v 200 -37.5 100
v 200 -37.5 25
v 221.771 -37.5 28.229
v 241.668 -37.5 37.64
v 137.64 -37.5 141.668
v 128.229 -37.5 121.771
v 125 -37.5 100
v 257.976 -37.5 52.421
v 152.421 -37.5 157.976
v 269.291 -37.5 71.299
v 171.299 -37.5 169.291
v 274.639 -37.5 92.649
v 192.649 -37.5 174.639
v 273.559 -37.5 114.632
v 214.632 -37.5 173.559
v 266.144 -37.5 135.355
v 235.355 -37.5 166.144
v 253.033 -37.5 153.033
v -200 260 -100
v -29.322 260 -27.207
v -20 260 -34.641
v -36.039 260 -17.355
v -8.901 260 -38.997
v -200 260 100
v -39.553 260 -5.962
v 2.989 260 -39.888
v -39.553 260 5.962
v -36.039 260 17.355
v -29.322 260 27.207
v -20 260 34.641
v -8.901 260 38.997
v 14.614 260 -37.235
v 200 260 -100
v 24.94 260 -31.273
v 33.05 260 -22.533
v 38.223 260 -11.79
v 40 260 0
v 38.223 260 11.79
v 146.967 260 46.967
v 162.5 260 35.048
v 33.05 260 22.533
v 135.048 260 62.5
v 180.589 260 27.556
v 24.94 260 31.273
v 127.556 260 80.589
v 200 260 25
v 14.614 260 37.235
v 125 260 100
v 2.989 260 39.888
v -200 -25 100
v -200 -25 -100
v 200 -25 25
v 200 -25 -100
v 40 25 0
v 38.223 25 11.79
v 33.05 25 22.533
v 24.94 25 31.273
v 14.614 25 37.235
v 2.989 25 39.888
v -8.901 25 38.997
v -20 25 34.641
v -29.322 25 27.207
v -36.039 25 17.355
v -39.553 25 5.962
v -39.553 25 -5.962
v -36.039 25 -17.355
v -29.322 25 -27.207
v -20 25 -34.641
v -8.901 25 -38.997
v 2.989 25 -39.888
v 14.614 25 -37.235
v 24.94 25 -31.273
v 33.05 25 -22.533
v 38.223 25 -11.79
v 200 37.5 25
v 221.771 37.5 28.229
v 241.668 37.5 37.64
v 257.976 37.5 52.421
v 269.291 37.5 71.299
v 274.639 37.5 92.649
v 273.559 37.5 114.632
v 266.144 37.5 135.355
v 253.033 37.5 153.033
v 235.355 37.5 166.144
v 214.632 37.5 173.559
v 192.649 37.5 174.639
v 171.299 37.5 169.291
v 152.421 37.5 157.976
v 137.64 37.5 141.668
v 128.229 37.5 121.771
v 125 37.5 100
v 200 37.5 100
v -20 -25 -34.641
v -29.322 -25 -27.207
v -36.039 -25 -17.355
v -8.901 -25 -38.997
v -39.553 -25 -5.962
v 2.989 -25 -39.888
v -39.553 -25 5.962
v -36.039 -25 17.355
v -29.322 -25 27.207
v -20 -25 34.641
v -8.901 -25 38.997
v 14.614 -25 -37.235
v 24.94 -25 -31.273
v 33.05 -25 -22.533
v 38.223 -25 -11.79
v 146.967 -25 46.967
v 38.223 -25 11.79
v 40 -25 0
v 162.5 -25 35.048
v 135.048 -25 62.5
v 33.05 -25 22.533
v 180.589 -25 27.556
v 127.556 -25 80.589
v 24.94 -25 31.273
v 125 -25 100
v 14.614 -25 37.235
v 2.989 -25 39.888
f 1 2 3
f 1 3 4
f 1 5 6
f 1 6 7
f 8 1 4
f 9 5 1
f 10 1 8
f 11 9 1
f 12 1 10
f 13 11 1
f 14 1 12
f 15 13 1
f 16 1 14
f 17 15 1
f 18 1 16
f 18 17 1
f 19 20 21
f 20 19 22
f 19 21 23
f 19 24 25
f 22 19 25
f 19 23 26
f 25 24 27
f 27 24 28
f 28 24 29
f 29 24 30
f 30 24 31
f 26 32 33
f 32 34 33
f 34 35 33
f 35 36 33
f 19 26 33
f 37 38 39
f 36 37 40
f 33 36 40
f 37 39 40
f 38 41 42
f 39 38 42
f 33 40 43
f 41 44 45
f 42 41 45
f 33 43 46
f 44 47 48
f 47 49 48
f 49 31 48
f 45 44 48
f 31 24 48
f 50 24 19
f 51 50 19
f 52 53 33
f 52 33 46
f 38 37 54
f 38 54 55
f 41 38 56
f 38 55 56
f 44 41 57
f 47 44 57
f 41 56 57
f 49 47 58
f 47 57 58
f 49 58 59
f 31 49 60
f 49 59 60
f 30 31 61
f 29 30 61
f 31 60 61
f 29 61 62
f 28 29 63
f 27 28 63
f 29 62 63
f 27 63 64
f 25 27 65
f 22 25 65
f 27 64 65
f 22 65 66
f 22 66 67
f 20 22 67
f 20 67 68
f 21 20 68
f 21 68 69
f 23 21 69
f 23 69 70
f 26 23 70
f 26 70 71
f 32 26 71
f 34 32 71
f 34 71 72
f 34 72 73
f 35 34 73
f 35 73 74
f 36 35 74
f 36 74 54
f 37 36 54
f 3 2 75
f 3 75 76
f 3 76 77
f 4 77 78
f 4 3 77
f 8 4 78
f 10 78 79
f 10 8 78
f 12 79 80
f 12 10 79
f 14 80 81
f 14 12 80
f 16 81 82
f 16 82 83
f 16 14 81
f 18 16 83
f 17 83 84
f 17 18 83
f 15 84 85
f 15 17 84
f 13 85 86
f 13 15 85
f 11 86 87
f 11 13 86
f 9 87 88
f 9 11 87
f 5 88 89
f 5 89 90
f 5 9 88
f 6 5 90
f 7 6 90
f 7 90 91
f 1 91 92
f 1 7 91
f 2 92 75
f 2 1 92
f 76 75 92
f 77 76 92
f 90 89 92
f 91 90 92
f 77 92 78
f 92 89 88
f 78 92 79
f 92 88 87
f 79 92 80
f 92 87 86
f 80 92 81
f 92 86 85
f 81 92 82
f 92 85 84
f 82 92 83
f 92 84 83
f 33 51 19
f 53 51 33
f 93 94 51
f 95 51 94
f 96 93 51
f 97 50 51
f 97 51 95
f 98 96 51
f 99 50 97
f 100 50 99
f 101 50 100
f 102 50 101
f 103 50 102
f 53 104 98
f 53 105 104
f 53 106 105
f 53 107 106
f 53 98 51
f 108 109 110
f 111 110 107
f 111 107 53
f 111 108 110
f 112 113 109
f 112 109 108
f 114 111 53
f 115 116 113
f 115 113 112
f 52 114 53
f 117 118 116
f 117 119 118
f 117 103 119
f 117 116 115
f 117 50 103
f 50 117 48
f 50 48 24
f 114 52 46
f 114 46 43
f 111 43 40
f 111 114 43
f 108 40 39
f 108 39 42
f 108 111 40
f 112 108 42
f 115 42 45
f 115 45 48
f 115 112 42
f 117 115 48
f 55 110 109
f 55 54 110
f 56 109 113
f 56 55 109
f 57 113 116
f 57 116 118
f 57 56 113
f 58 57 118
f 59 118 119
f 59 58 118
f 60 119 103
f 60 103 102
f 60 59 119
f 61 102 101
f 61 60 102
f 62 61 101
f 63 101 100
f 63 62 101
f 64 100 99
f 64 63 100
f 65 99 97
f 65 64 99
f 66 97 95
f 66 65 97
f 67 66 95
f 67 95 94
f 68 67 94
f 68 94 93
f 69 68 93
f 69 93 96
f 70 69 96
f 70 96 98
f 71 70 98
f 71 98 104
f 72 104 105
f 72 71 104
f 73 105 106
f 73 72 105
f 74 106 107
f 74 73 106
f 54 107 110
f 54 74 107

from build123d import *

# Parameters (mm, degrees)
F0_R     = 40
F1_DEPTH = 25
F2_DEPTH = 285
F3_DEPTH = 37.5


with BuildPart() as f1:
    # F0 (on Front) → F1 (new body, symmetric)
    with BuildSketch(Plane.XZ):
        with BuildLine():
            Line((-200, 100), (-200, -100))
            Line((-200, -100), (200, -100))
            Line((200, -100), (200, 25))
            ThreePointArc((200, 25), (146.966991411, 46.966991411), (125, 100))
            Line((125, 100), (-200, 100))
        make_face()
        Circle(F0_R, mode=Mode.SUBTRACT)
    extrude(amount=F1_DEPTH, both=True)

    # F2 (add): a face of the model
    f2_faces = [f1.faces().sort_by_distance(p)[0] for p in [
        (143.8047137508, -25, 43.8047137508),
    ]]
    extrude(f2_faces, amount=-F2_DEPTH)


with BuildPart() as f3:
    # F0 (on Front) → F3 (new body, symmetric)
    with BuildSketch(Plane.XZ):
        with BuildLine():
            Line((200, 100), (200, 25))
            ThreePointArc((200, 25), (253.033008589, 46.966991411), (275, 100))
            ThreePointArc((275, 100), (253.8200708687, 152.2340882153), (202.2426674217, 174.9664621203))
            ThreePointArc((202.2426674217, 174.9664621203), (147.7659117847, 153.8200708687), (125, 100))
            Line((125, 100), (200, 100))
        make_face()
    extrude(amount=F3_DEPTH, both=True)


solid = Compound([f1.part, f3.part])
